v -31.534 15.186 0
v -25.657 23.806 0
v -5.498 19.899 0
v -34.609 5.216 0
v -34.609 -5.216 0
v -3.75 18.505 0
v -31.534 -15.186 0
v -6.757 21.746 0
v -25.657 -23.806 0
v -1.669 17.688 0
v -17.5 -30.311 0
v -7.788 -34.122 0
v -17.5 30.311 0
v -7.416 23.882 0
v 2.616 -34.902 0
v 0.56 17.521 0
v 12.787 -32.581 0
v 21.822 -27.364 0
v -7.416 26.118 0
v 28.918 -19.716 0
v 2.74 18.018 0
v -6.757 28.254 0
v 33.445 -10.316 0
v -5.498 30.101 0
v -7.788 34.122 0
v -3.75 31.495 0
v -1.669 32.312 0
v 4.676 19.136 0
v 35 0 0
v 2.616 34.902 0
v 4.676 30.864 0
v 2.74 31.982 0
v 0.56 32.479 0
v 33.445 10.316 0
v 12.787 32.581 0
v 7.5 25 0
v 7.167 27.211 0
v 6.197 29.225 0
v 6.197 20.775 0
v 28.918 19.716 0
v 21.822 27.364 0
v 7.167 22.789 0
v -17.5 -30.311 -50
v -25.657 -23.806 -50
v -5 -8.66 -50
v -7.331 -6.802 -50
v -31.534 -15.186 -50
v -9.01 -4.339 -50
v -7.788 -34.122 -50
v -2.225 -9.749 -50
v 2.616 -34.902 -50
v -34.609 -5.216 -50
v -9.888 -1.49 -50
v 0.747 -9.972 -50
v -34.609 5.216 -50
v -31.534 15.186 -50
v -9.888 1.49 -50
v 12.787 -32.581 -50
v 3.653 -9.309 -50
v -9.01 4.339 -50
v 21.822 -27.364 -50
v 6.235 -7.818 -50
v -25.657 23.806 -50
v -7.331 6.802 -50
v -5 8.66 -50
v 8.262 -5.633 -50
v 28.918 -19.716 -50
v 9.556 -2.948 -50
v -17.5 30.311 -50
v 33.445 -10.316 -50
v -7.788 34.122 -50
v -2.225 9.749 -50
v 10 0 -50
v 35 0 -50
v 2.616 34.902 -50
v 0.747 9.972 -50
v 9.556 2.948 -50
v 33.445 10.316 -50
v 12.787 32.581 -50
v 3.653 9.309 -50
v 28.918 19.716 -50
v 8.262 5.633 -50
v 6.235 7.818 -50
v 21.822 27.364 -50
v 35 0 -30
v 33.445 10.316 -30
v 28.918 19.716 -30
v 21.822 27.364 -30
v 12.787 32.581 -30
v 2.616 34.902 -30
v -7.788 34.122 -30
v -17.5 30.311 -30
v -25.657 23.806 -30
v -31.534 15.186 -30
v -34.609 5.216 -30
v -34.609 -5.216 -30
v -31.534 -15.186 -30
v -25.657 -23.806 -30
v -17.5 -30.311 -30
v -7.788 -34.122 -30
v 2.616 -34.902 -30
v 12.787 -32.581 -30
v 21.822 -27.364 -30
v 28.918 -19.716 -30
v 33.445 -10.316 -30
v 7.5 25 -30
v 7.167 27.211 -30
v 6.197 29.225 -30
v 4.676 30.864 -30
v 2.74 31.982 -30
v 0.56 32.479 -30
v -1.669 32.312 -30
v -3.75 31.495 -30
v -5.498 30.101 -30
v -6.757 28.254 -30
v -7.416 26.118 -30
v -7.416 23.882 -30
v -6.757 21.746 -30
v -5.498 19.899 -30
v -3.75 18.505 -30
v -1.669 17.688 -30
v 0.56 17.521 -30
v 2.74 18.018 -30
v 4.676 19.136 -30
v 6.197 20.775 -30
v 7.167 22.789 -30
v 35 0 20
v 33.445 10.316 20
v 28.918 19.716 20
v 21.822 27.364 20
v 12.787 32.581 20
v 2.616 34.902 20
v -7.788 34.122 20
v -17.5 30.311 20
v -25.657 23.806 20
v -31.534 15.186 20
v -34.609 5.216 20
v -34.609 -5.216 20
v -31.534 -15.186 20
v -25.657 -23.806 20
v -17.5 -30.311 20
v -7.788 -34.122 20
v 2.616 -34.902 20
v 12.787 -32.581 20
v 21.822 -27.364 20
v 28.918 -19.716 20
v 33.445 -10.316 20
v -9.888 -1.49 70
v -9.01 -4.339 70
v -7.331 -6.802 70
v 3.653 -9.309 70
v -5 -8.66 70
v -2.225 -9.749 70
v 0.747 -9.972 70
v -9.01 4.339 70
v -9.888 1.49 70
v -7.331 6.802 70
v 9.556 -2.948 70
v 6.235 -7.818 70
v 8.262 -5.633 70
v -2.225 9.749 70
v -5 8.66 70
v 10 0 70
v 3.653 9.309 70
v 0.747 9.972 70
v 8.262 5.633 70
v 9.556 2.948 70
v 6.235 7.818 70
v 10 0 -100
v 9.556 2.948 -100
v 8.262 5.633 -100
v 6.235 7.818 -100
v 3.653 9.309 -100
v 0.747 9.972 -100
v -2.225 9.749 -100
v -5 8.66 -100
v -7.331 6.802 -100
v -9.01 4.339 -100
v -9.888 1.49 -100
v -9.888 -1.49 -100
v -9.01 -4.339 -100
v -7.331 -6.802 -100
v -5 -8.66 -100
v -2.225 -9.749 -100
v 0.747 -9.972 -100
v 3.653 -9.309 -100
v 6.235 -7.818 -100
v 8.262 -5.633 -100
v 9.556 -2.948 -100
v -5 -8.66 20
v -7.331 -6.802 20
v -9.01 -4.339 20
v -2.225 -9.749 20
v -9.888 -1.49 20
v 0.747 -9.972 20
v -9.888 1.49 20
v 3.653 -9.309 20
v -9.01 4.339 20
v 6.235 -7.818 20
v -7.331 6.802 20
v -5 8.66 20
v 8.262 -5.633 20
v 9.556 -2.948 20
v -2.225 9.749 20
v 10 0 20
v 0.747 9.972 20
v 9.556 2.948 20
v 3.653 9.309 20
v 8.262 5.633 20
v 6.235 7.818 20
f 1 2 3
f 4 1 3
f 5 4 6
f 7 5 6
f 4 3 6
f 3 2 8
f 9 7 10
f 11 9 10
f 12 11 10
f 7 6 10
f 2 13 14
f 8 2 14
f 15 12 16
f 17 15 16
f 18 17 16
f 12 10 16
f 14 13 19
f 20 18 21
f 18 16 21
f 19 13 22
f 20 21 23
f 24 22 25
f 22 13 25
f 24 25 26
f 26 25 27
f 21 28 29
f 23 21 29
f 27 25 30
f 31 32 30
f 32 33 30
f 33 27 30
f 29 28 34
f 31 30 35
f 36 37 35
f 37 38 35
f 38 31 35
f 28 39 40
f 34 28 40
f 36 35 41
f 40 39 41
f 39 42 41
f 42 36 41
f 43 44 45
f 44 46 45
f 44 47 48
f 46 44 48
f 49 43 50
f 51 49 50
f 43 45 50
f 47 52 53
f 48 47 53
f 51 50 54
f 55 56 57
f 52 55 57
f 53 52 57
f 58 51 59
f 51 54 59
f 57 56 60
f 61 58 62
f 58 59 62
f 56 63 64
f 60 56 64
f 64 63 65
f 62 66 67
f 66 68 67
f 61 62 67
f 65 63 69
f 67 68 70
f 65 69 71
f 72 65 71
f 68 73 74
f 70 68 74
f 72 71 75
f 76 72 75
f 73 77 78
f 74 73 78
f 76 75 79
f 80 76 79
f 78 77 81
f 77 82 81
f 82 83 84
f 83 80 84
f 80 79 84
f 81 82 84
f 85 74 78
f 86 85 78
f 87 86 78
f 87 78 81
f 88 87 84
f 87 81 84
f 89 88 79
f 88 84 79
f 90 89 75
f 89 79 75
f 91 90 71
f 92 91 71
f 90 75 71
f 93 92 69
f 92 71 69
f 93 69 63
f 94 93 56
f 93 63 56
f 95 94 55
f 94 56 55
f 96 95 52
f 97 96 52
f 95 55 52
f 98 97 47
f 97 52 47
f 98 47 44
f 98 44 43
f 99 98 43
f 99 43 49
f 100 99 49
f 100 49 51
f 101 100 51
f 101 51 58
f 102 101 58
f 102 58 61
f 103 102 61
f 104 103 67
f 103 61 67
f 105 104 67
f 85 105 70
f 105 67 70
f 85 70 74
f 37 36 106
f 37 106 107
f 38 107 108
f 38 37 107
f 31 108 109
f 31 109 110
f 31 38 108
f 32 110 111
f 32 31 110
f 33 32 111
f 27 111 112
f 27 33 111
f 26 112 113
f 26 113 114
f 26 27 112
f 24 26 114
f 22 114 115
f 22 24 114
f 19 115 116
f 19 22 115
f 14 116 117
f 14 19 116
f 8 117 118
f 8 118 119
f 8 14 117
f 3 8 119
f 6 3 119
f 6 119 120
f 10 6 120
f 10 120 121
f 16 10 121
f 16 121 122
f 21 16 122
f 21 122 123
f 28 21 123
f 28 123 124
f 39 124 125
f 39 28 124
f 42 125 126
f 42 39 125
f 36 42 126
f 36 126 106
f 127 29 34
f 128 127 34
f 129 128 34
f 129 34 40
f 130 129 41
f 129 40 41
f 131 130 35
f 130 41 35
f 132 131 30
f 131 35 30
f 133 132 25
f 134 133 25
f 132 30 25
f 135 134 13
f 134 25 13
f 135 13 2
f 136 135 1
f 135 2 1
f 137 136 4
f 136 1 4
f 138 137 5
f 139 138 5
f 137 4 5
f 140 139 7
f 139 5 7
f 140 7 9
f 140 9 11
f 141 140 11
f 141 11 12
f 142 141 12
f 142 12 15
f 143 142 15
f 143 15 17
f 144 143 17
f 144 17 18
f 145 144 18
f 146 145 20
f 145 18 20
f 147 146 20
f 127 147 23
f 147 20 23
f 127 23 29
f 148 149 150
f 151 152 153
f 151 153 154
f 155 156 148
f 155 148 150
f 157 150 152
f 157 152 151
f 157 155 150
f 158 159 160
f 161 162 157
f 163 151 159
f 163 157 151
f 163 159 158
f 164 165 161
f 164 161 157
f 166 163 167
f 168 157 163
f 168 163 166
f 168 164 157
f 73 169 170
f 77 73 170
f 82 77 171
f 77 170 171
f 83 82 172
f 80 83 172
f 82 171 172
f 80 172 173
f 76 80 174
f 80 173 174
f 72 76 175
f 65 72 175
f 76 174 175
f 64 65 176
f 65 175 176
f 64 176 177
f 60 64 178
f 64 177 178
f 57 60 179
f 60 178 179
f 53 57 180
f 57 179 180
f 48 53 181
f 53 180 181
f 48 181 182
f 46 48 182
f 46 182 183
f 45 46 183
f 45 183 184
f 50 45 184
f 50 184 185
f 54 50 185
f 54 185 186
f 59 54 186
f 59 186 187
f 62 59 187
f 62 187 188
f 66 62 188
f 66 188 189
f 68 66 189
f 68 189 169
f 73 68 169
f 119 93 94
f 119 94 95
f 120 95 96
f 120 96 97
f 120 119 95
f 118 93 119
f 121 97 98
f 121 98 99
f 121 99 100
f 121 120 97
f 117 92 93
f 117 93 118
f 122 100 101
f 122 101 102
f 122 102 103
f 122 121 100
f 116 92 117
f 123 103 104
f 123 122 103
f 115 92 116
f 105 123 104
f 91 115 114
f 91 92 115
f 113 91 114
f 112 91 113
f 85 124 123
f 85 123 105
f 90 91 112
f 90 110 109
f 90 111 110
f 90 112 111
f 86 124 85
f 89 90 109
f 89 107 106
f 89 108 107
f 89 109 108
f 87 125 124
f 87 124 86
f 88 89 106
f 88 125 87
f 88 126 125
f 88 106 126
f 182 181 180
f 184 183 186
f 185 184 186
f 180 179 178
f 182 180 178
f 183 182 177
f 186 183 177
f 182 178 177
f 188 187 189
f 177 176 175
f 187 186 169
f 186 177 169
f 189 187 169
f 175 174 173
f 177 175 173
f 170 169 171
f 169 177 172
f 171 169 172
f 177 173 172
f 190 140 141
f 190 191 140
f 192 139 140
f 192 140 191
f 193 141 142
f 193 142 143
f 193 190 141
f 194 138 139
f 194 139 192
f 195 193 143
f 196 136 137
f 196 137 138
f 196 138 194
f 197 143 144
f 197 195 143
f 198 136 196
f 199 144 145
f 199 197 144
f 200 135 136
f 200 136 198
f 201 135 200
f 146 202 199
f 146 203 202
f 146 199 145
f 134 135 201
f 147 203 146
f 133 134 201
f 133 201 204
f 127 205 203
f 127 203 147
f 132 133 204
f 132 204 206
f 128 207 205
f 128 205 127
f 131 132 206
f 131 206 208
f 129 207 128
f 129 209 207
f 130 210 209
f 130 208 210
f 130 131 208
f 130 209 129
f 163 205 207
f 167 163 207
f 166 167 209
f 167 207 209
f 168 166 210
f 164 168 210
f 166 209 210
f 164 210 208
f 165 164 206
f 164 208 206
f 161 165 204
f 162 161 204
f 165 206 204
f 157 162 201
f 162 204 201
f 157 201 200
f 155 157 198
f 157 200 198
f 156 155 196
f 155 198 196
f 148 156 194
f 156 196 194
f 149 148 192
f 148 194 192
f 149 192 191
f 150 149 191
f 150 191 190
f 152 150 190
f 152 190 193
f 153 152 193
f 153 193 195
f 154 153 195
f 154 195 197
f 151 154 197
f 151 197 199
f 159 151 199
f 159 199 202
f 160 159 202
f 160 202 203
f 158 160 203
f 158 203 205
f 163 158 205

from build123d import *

# Parameters (mm, degrees)
SKETCH1_R           = 7.5
BOSS_EXTRUDE1_DEPTH = 30
SKETCH1_4_R         = 35
SKETCH1_4_R_2       = 10
BOSS_EXTRUDE2_DEPTH = 20
BOSS_EXTRUDE3_START = -50
SKETCH1_5_R         = 35
SKETCH1_5_R_2       = 10
BOSS_EXTRUDE3_DEPTH = 20
SKETCH1_6_R         = 10
BOSS_EXTRUDE4_DEPTH = 70
BOSS_EXTRUDE5_START = -100
SKETCH1_7_R         = 10
BOSS_EXTRUDE5_DEPTH = 70


with BuildPart() as part:
    # Sketch1 → Boss-Extrude1 (new body)
    with BuildSketch(Plane.XY):
        with Locations((0, 25)):
            Circle(SKETCH1_R)
    extrude(amount=-BOSS_EXTRUDE1_DEPTH)

    # Sketch1<4> → Boss-Extrude2 (add)
    with BuildSketch(Plane.XY):
        Circle(SKETCH1_4_R)
        Circle(SKETCH1_4_R_2, mode=Mode.SUBTRACT)
    extrude(amount=BOSS_EXTRUDE2_DEPTH)

    # Sketch1<5> → Boss-Extrude3 (add)
    with BuildSketch(Plane.XY.offset(BOSS_EXTRUDE3_START)):
        Circle(SKETCH1_5_R)
        Circle(SKETCH1_5_R_2, mode=Mode.SUBTRACT)
    extrude(amount=BOSS_EXTRUDE3_DEPTH)

    # Sketch1<6> → Boss-Extrude4 (add)
    with BuildSketch(Plane.XY):
        Circle(SKETCH1_6_R)
    extrude(amount=BOSS_EXTRUDE4_DEPTH)

    # Sketch1<7> → Boss-Extrude5 (add)
    with BuildSketch(Plane.XY.offset(BOSS_EXTRUDE5_START)):
        Circle(SKETCH1_7_R)
    extrude(amount=BOSS_EXTRUDE5_DEPTH)


solid = part.part
